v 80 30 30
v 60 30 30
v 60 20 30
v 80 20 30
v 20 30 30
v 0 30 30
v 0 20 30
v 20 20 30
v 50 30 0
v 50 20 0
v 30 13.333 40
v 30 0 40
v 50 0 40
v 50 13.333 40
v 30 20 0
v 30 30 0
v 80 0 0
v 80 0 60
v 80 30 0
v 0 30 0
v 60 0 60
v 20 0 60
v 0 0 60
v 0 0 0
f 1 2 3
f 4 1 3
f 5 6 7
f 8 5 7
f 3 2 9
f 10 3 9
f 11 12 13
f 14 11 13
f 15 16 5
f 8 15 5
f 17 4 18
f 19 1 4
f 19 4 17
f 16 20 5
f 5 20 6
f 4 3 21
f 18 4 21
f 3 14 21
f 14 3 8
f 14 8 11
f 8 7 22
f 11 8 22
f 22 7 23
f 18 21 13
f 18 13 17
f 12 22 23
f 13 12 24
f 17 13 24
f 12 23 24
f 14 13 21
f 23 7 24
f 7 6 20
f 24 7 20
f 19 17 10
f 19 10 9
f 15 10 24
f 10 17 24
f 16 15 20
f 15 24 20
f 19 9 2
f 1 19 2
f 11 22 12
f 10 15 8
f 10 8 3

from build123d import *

# Parameters (mm, degrees)
BOSS_EXTRUDE1_DEPTH = 80
CUT_EXTRUDE1_DEPTH  = 10
CUT_EXTRUDE2_REACH  = 106.403


with BuildPart() as part:
    # Sketch2 → Boss-Extrude1 (new body)
    with BuildSketch(Plane(origin=(0, 0, 0), x_dir=(0, 0, -1), z_dir=(1, 0, 0))):
        Polygon((0, 0), (0, 30), (-30, 30), (-30, 20), (-60, 0), align=None)
    extrude(amount=BOSS_EXTRUDE1_DEPTH)

    # Sketch3 → Cut-Extrude1 (cut)
    with BuildSketch(Plane(origin=(0, 30, 0), x_dir=(1, 0, 0), z_dir=(0, 1, 0))):
        Polygon((50, 0), (30, 0), (20, -30), (60, -30), align=None)
    extrude(amount=-CUT_EXTRUDE1_DEPTH, mode=Mode.SUBTRACT)

    # Sketch4 → Cut-Extrude2 (cut, up to next)
    with BuildSketch(Plane.XZ, mode=Mode.PRIVATE) as cut_extrude2_sk1:
        Polygon((60, 60), (20, 60), (30, 40), (50, 40), align=None)
    cut_extrude2_tool1 = extrude(cut_extrude2_sk1.sketch, amount=-CUT_EXTRUDE2_REACH, mode=Mode.PRIVATE) & part.part
    add(cut_extrude2_tool1.solids().sort_by_distance((40, 0, 51.111111))[0], mode=Mode.SUBTRACT)


solid = part.part
